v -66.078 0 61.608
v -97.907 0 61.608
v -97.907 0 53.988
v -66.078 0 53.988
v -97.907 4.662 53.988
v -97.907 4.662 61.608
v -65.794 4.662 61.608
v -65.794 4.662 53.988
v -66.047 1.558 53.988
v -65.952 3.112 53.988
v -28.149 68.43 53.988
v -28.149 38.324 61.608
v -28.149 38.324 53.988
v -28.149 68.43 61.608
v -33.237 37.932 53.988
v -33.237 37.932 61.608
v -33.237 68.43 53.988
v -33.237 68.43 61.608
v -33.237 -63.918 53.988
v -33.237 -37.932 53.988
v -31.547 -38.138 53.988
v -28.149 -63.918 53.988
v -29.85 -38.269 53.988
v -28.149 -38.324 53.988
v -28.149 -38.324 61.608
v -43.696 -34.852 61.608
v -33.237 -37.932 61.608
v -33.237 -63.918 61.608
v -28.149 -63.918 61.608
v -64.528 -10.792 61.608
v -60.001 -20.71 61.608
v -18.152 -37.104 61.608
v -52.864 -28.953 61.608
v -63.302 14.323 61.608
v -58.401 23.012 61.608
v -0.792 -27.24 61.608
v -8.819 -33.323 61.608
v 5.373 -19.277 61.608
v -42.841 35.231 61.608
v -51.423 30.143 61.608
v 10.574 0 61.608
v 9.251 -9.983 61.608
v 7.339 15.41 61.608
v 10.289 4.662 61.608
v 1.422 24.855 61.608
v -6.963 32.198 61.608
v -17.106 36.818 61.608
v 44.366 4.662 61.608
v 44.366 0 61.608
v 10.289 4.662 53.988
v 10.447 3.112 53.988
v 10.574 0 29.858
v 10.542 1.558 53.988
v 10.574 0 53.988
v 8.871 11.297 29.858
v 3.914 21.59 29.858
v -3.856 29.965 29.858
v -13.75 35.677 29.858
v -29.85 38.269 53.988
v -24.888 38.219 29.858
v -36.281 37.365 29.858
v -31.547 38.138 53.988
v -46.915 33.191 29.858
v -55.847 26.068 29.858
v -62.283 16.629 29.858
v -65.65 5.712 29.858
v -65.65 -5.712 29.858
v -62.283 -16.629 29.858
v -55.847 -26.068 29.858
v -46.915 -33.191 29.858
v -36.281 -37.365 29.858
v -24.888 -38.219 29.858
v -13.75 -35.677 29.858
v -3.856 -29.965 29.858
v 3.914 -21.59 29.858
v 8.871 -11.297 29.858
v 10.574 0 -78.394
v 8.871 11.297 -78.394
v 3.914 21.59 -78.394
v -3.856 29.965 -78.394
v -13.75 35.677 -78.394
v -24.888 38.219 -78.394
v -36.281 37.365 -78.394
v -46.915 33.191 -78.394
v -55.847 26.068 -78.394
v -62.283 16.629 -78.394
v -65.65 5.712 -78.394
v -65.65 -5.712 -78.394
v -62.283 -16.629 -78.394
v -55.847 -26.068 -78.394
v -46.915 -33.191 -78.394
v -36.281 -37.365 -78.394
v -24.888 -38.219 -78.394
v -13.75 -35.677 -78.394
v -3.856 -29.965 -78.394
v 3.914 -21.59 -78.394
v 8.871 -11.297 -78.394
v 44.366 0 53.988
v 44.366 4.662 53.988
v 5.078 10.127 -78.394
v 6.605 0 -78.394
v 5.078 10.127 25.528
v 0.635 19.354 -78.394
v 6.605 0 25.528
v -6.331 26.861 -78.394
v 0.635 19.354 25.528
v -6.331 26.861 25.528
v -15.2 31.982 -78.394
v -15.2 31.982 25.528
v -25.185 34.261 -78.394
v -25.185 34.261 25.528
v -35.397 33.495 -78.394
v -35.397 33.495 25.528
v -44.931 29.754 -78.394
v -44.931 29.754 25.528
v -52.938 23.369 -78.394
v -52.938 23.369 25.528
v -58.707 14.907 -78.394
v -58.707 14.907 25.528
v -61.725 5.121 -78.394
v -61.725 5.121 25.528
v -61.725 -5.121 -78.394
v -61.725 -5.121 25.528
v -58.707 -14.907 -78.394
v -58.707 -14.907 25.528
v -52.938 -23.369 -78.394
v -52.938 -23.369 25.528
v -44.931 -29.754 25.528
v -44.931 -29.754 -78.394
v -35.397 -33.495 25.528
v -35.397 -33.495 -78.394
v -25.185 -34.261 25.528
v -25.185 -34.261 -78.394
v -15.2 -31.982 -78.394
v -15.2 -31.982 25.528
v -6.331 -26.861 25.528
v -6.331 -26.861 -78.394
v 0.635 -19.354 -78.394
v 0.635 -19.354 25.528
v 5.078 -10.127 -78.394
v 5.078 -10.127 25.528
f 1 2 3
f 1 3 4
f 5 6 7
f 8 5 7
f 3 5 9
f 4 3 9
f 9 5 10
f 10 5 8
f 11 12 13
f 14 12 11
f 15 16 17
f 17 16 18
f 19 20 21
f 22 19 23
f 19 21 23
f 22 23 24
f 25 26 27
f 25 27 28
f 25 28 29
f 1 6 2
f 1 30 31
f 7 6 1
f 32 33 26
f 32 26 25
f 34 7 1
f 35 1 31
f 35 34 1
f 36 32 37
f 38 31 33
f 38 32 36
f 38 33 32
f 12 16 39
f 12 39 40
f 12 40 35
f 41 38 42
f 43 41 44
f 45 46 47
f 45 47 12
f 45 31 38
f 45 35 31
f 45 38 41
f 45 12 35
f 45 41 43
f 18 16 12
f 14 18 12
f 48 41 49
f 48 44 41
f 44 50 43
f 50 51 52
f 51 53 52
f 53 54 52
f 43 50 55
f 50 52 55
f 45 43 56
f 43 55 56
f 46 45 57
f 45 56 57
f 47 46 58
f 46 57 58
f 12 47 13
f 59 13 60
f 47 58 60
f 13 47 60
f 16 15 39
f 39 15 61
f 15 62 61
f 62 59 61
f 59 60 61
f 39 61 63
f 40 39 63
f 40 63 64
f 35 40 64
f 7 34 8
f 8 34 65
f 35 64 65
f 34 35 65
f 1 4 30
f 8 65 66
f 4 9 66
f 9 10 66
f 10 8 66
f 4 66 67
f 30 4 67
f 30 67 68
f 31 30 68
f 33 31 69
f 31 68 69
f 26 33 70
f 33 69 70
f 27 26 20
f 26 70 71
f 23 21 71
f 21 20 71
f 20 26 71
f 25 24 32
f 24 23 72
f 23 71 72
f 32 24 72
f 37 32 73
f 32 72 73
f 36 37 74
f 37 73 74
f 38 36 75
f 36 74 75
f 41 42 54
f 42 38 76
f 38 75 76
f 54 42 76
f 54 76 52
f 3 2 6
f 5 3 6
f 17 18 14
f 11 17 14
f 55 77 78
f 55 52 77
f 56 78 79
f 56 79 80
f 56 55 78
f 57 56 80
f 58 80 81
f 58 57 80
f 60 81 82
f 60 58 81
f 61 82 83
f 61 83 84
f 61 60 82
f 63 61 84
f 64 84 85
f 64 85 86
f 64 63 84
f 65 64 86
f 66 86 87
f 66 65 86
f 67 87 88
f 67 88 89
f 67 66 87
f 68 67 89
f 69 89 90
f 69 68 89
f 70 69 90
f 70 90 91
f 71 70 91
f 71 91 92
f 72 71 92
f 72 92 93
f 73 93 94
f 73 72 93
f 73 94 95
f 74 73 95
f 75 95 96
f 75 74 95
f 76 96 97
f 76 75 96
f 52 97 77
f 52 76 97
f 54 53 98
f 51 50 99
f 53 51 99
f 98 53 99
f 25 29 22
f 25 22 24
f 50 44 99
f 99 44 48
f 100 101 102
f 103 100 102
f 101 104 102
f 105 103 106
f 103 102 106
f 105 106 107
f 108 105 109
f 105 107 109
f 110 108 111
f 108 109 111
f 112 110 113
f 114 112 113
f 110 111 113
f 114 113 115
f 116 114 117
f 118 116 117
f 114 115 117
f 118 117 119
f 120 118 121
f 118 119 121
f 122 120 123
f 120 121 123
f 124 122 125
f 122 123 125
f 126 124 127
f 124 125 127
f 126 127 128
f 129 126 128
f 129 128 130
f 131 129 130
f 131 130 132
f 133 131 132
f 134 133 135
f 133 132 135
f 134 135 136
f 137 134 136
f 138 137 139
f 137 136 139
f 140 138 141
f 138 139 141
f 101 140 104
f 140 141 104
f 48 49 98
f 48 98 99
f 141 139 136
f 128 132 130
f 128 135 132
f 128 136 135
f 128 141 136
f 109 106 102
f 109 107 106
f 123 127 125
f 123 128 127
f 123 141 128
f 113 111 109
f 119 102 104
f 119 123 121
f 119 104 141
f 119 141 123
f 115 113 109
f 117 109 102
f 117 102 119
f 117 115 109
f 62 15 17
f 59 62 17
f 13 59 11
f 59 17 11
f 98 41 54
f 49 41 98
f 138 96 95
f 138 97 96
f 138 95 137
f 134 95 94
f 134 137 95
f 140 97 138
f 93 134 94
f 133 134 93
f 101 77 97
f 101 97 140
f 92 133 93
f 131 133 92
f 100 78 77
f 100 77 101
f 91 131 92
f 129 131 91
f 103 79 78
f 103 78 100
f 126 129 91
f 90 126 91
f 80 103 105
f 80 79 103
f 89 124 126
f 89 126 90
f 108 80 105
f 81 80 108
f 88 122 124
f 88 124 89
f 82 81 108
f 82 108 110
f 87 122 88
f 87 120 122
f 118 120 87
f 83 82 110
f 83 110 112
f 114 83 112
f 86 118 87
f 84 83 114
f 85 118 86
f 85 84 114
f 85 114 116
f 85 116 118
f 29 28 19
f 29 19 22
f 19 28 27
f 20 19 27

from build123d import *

# Parameters (mm, degrees)
F0_W     = 3.9692334831
F0_H     = 103.9218027145
F2_DEPTH = 31.75
F3_W     = 64.669739455
F3_H     = 4.6622371301
F3_W_2   = 5.0883553922
F3_H_2   = 63.7673670426
F3_W_3   = 72.5153312087
F3_H_3   = 63.9177635312
F4_DEPTH = 7.62


with BuildPart() as f1:
    # F0 (on Front) → F1 (revolve)
    with BuildSketch(Plane.XZ):
        Polygon((10.5738220736, 29.8581575043), (-27.7522327378, 29.8581575043), (-27.7522327378, 25.5280886777), (6.6045885906, 25.5280886777), (10.5738220736, 25.5280886777), align=None)
        with Locations((8.5892053321, -26.4328126796)):
            Rectangle(F0_W, F0_H)
    revolve(axis=Axis((-27.7522327378, 0, 22.6518814452), (0, 0, 1)))

    # F2 (add): a face of the model
    f2_faces = [f1.faces().sort_by_distance(p)[0] for p in [
        (-27.7522327378, 0, 29.8581575043),
    ]]
    extrude(f2_faces, amount=F2_DEPTH)

    # F3 (on face) → F4 (join)
    with BuildSketch(Plane.XY.offset(61.6081575043)):
        with Locations((-65.5721072108, 2.3311185651)):
            Rectangle(F3_W, F3_H)
        with Locations((-30.6930597872, 36.5459206514)):
            Rectangle(F3_W_2, F3_H_2)
        with Locations((-30.6930597872, 2.3311185651)):
            Rectangle(F3_W_2, F3_H)
        with Locations((8.1087835133, 2.3311185651)):
            Rectangle(F3_W_3, F3_H)
        with Locations((-30.6930597872, -31.9588817656)):
            Rectangle(F3_W_2, F3_H_3)
    extrude(amount=-F4_DEPTH)


solid = f1.part
